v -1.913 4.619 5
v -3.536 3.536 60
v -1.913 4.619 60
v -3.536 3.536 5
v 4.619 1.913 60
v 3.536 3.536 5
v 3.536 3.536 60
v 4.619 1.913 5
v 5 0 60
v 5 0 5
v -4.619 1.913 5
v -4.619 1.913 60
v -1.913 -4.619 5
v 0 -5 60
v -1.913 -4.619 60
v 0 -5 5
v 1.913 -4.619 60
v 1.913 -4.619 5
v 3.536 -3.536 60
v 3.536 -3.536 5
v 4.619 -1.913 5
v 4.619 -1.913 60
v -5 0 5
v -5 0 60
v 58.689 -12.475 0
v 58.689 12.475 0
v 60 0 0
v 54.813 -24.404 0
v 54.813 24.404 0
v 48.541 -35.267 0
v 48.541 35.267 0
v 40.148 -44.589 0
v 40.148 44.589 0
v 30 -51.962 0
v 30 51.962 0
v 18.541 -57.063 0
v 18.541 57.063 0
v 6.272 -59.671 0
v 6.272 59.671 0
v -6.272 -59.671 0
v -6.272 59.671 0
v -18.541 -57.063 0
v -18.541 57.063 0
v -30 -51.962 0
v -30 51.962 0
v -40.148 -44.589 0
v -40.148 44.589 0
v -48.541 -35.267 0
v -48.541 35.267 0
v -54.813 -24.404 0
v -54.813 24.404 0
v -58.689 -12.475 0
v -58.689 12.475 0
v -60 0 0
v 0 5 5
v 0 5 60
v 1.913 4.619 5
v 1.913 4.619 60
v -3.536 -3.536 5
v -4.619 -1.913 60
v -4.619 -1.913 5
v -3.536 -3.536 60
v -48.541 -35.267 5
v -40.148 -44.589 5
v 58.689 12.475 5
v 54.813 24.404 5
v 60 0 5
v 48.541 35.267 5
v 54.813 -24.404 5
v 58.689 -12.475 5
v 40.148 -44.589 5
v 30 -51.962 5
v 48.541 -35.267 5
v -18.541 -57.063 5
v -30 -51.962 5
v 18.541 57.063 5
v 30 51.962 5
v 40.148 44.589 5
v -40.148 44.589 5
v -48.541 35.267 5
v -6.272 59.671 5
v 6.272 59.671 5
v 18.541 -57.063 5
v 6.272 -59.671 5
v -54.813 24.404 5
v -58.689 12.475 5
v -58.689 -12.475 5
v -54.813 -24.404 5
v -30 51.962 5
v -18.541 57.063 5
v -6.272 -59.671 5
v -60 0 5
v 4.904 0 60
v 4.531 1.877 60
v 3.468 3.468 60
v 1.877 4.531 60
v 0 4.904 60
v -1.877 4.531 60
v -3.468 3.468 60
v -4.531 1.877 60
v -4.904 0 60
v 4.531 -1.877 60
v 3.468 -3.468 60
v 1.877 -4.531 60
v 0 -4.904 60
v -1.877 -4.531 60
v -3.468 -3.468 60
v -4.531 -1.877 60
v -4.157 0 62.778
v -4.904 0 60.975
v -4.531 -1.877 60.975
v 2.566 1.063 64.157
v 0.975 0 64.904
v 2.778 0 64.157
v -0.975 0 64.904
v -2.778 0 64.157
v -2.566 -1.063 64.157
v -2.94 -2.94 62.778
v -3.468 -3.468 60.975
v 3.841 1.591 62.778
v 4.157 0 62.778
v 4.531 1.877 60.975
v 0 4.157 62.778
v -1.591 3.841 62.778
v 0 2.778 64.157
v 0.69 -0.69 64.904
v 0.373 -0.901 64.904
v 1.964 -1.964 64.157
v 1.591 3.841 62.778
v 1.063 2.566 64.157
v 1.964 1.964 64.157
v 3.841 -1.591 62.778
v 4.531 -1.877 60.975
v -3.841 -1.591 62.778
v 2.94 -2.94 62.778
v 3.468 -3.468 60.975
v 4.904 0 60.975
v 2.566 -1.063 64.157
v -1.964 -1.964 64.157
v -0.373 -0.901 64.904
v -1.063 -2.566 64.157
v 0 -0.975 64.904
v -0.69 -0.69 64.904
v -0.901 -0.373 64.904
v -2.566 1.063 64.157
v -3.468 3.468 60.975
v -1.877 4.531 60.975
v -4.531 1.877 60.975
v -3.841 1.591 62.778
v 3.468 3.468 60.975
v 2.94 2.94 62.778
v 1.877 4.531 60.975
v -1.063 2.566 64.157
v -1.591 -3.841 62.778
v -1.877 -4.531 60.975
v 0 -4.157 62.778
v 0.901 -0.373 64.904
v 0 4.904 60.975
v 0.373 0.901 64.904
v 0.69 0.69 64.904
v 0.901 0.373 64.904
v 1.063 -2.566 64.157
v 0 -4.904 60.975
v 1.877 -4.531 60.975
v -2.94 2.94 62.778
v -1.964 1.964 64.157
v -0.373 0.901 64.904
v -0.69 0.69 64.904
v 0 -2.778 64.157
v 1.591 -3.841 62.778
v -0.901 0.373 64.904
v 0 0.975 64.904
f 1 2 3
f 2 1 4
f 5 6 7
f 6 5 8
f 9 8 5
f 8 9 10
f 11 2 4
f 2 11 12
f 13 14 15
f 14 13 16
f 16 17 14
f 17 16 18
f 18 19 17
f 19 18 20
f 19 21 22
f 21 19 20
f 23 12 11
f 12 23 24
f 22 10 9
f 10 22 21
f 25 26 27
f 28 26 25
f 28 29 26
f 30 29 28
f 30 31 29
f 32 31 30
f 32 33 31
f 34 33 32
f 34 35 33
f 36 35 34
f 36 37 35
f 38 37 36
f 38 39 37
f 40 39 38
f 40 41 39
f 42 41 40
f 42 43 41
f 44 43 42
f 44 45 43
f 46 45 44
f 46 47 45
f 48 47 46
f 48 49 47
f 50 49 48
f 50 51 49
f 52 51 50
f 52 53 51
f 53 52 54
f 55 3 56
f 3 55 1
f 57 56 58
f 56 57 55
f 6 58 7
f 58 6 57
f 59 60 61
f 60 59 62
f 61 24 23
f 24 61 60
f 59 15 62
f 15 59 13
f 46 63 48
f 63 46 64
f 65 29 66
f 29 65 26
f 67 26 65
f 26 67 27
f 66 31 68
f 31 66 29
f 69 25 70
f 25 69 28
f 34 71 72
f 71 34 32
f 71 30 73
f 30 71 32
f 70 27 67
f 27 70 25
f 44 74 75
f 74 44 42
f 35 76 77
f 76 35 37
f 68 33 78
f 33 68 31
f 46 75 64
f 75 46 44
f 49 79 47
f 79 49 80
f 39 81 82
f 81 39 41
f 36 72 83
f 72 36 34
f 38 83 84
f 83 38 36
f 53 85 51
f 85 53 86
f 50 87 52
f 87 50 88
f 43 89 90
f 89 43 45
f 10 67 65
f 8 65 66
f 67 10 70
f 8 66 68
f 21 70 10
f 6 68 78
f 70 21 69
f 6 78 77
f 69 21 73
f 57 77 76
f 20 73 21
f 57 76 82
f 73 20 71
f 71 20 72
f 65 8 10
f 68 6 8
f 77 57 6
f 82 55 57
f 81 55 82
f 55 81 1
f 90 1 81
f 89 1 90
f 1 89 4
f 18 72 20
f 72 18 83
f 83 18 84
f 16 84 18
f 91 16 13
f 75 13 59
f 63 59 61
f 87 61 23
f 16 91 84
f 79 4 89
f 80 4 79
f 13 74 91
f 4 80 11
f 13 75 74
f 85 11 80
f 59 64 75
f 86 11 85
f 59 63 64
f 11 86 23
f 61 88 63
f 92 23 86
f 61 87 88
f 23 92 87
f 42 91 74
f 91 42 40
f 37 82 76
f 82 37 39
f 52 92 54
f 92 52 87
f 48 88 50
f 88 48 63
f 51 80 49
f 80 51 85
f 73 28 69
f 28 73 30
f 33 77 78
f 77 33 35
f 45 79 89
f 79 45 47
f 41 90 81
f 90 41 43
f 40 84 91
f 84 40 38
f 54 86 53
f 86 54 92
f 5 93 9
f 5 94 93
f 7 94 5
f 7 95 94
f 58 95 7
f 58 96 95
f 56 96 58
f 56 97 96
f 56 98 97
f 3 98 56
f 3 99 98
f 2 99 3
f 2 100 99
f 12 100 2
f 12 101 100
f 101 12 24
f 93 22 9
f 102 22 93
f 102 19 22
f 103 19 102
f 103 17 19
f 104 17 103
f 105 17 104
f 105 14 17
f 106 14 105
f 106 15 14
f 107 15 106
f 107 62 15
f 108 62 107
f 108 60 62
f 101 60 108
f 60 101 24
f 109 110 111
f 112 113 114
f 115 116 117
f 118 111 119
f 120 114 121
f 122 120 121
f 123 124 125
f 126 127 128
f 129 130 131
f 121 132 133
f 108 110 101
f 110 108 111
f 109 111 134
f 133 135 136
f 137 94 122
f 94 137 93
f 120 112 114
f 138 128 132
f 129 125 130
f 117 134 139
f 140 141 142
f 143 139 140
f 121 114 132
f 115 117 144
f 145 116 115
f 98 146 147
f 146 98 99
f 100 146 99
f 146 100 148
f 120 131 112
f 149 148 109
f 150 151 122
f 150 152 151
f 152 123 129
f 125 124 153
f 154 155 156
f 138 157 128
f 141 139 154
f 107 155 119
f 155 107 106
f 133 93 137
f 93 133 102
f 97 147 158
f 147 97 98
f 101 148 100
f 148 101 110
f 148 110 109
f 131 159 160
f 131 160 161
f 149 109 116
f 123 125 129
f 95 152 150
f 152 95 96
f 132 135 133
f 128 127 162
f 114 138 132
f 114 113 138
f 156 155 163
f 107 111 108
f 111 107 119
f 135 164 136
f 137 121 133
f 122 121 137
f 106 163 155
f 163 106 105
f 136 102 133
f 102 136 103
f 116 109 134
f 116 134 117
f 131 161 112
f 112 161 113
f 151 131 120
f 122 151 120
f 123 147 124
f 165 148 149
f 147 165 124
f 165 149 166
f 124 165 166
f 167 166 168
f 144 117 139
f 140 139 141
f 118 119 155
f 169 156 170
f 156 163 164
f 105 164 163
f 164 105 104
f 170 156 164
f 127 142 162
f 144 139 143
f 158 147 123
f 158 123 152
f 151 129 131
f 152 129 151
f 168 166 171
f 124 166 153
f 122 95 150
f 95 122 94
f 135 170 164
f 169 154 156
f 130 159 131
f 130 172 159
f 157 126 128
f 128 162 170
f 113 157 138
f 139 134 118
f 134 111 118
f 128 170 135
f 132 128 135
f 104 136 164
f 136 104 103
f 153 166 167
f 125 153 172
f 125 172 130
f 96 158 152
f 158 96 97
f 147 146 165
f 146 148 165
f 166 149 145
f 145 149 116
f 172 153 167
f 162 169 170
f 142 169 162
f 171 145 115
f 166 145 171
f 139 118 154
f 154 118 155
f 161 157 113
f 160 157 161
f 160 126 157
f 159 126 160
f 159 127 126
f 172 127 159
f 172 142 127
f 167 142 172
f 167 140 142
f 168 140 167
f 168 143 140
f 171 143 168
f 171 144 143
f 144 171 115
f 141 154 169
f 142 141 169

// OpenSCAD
cylinder(h = 5, r = 60);
union() {
	cylinder(h = 40, r = 5);
	cube(h = 50, r1 = 60, r2 = 10);
}
	

union() {
  cylinder(h = 5, r = 60);
  cylinder(h = 60, r = 5);
translate([0, 0, 120 * sin(30)])
	sphere(r = 5);
}
